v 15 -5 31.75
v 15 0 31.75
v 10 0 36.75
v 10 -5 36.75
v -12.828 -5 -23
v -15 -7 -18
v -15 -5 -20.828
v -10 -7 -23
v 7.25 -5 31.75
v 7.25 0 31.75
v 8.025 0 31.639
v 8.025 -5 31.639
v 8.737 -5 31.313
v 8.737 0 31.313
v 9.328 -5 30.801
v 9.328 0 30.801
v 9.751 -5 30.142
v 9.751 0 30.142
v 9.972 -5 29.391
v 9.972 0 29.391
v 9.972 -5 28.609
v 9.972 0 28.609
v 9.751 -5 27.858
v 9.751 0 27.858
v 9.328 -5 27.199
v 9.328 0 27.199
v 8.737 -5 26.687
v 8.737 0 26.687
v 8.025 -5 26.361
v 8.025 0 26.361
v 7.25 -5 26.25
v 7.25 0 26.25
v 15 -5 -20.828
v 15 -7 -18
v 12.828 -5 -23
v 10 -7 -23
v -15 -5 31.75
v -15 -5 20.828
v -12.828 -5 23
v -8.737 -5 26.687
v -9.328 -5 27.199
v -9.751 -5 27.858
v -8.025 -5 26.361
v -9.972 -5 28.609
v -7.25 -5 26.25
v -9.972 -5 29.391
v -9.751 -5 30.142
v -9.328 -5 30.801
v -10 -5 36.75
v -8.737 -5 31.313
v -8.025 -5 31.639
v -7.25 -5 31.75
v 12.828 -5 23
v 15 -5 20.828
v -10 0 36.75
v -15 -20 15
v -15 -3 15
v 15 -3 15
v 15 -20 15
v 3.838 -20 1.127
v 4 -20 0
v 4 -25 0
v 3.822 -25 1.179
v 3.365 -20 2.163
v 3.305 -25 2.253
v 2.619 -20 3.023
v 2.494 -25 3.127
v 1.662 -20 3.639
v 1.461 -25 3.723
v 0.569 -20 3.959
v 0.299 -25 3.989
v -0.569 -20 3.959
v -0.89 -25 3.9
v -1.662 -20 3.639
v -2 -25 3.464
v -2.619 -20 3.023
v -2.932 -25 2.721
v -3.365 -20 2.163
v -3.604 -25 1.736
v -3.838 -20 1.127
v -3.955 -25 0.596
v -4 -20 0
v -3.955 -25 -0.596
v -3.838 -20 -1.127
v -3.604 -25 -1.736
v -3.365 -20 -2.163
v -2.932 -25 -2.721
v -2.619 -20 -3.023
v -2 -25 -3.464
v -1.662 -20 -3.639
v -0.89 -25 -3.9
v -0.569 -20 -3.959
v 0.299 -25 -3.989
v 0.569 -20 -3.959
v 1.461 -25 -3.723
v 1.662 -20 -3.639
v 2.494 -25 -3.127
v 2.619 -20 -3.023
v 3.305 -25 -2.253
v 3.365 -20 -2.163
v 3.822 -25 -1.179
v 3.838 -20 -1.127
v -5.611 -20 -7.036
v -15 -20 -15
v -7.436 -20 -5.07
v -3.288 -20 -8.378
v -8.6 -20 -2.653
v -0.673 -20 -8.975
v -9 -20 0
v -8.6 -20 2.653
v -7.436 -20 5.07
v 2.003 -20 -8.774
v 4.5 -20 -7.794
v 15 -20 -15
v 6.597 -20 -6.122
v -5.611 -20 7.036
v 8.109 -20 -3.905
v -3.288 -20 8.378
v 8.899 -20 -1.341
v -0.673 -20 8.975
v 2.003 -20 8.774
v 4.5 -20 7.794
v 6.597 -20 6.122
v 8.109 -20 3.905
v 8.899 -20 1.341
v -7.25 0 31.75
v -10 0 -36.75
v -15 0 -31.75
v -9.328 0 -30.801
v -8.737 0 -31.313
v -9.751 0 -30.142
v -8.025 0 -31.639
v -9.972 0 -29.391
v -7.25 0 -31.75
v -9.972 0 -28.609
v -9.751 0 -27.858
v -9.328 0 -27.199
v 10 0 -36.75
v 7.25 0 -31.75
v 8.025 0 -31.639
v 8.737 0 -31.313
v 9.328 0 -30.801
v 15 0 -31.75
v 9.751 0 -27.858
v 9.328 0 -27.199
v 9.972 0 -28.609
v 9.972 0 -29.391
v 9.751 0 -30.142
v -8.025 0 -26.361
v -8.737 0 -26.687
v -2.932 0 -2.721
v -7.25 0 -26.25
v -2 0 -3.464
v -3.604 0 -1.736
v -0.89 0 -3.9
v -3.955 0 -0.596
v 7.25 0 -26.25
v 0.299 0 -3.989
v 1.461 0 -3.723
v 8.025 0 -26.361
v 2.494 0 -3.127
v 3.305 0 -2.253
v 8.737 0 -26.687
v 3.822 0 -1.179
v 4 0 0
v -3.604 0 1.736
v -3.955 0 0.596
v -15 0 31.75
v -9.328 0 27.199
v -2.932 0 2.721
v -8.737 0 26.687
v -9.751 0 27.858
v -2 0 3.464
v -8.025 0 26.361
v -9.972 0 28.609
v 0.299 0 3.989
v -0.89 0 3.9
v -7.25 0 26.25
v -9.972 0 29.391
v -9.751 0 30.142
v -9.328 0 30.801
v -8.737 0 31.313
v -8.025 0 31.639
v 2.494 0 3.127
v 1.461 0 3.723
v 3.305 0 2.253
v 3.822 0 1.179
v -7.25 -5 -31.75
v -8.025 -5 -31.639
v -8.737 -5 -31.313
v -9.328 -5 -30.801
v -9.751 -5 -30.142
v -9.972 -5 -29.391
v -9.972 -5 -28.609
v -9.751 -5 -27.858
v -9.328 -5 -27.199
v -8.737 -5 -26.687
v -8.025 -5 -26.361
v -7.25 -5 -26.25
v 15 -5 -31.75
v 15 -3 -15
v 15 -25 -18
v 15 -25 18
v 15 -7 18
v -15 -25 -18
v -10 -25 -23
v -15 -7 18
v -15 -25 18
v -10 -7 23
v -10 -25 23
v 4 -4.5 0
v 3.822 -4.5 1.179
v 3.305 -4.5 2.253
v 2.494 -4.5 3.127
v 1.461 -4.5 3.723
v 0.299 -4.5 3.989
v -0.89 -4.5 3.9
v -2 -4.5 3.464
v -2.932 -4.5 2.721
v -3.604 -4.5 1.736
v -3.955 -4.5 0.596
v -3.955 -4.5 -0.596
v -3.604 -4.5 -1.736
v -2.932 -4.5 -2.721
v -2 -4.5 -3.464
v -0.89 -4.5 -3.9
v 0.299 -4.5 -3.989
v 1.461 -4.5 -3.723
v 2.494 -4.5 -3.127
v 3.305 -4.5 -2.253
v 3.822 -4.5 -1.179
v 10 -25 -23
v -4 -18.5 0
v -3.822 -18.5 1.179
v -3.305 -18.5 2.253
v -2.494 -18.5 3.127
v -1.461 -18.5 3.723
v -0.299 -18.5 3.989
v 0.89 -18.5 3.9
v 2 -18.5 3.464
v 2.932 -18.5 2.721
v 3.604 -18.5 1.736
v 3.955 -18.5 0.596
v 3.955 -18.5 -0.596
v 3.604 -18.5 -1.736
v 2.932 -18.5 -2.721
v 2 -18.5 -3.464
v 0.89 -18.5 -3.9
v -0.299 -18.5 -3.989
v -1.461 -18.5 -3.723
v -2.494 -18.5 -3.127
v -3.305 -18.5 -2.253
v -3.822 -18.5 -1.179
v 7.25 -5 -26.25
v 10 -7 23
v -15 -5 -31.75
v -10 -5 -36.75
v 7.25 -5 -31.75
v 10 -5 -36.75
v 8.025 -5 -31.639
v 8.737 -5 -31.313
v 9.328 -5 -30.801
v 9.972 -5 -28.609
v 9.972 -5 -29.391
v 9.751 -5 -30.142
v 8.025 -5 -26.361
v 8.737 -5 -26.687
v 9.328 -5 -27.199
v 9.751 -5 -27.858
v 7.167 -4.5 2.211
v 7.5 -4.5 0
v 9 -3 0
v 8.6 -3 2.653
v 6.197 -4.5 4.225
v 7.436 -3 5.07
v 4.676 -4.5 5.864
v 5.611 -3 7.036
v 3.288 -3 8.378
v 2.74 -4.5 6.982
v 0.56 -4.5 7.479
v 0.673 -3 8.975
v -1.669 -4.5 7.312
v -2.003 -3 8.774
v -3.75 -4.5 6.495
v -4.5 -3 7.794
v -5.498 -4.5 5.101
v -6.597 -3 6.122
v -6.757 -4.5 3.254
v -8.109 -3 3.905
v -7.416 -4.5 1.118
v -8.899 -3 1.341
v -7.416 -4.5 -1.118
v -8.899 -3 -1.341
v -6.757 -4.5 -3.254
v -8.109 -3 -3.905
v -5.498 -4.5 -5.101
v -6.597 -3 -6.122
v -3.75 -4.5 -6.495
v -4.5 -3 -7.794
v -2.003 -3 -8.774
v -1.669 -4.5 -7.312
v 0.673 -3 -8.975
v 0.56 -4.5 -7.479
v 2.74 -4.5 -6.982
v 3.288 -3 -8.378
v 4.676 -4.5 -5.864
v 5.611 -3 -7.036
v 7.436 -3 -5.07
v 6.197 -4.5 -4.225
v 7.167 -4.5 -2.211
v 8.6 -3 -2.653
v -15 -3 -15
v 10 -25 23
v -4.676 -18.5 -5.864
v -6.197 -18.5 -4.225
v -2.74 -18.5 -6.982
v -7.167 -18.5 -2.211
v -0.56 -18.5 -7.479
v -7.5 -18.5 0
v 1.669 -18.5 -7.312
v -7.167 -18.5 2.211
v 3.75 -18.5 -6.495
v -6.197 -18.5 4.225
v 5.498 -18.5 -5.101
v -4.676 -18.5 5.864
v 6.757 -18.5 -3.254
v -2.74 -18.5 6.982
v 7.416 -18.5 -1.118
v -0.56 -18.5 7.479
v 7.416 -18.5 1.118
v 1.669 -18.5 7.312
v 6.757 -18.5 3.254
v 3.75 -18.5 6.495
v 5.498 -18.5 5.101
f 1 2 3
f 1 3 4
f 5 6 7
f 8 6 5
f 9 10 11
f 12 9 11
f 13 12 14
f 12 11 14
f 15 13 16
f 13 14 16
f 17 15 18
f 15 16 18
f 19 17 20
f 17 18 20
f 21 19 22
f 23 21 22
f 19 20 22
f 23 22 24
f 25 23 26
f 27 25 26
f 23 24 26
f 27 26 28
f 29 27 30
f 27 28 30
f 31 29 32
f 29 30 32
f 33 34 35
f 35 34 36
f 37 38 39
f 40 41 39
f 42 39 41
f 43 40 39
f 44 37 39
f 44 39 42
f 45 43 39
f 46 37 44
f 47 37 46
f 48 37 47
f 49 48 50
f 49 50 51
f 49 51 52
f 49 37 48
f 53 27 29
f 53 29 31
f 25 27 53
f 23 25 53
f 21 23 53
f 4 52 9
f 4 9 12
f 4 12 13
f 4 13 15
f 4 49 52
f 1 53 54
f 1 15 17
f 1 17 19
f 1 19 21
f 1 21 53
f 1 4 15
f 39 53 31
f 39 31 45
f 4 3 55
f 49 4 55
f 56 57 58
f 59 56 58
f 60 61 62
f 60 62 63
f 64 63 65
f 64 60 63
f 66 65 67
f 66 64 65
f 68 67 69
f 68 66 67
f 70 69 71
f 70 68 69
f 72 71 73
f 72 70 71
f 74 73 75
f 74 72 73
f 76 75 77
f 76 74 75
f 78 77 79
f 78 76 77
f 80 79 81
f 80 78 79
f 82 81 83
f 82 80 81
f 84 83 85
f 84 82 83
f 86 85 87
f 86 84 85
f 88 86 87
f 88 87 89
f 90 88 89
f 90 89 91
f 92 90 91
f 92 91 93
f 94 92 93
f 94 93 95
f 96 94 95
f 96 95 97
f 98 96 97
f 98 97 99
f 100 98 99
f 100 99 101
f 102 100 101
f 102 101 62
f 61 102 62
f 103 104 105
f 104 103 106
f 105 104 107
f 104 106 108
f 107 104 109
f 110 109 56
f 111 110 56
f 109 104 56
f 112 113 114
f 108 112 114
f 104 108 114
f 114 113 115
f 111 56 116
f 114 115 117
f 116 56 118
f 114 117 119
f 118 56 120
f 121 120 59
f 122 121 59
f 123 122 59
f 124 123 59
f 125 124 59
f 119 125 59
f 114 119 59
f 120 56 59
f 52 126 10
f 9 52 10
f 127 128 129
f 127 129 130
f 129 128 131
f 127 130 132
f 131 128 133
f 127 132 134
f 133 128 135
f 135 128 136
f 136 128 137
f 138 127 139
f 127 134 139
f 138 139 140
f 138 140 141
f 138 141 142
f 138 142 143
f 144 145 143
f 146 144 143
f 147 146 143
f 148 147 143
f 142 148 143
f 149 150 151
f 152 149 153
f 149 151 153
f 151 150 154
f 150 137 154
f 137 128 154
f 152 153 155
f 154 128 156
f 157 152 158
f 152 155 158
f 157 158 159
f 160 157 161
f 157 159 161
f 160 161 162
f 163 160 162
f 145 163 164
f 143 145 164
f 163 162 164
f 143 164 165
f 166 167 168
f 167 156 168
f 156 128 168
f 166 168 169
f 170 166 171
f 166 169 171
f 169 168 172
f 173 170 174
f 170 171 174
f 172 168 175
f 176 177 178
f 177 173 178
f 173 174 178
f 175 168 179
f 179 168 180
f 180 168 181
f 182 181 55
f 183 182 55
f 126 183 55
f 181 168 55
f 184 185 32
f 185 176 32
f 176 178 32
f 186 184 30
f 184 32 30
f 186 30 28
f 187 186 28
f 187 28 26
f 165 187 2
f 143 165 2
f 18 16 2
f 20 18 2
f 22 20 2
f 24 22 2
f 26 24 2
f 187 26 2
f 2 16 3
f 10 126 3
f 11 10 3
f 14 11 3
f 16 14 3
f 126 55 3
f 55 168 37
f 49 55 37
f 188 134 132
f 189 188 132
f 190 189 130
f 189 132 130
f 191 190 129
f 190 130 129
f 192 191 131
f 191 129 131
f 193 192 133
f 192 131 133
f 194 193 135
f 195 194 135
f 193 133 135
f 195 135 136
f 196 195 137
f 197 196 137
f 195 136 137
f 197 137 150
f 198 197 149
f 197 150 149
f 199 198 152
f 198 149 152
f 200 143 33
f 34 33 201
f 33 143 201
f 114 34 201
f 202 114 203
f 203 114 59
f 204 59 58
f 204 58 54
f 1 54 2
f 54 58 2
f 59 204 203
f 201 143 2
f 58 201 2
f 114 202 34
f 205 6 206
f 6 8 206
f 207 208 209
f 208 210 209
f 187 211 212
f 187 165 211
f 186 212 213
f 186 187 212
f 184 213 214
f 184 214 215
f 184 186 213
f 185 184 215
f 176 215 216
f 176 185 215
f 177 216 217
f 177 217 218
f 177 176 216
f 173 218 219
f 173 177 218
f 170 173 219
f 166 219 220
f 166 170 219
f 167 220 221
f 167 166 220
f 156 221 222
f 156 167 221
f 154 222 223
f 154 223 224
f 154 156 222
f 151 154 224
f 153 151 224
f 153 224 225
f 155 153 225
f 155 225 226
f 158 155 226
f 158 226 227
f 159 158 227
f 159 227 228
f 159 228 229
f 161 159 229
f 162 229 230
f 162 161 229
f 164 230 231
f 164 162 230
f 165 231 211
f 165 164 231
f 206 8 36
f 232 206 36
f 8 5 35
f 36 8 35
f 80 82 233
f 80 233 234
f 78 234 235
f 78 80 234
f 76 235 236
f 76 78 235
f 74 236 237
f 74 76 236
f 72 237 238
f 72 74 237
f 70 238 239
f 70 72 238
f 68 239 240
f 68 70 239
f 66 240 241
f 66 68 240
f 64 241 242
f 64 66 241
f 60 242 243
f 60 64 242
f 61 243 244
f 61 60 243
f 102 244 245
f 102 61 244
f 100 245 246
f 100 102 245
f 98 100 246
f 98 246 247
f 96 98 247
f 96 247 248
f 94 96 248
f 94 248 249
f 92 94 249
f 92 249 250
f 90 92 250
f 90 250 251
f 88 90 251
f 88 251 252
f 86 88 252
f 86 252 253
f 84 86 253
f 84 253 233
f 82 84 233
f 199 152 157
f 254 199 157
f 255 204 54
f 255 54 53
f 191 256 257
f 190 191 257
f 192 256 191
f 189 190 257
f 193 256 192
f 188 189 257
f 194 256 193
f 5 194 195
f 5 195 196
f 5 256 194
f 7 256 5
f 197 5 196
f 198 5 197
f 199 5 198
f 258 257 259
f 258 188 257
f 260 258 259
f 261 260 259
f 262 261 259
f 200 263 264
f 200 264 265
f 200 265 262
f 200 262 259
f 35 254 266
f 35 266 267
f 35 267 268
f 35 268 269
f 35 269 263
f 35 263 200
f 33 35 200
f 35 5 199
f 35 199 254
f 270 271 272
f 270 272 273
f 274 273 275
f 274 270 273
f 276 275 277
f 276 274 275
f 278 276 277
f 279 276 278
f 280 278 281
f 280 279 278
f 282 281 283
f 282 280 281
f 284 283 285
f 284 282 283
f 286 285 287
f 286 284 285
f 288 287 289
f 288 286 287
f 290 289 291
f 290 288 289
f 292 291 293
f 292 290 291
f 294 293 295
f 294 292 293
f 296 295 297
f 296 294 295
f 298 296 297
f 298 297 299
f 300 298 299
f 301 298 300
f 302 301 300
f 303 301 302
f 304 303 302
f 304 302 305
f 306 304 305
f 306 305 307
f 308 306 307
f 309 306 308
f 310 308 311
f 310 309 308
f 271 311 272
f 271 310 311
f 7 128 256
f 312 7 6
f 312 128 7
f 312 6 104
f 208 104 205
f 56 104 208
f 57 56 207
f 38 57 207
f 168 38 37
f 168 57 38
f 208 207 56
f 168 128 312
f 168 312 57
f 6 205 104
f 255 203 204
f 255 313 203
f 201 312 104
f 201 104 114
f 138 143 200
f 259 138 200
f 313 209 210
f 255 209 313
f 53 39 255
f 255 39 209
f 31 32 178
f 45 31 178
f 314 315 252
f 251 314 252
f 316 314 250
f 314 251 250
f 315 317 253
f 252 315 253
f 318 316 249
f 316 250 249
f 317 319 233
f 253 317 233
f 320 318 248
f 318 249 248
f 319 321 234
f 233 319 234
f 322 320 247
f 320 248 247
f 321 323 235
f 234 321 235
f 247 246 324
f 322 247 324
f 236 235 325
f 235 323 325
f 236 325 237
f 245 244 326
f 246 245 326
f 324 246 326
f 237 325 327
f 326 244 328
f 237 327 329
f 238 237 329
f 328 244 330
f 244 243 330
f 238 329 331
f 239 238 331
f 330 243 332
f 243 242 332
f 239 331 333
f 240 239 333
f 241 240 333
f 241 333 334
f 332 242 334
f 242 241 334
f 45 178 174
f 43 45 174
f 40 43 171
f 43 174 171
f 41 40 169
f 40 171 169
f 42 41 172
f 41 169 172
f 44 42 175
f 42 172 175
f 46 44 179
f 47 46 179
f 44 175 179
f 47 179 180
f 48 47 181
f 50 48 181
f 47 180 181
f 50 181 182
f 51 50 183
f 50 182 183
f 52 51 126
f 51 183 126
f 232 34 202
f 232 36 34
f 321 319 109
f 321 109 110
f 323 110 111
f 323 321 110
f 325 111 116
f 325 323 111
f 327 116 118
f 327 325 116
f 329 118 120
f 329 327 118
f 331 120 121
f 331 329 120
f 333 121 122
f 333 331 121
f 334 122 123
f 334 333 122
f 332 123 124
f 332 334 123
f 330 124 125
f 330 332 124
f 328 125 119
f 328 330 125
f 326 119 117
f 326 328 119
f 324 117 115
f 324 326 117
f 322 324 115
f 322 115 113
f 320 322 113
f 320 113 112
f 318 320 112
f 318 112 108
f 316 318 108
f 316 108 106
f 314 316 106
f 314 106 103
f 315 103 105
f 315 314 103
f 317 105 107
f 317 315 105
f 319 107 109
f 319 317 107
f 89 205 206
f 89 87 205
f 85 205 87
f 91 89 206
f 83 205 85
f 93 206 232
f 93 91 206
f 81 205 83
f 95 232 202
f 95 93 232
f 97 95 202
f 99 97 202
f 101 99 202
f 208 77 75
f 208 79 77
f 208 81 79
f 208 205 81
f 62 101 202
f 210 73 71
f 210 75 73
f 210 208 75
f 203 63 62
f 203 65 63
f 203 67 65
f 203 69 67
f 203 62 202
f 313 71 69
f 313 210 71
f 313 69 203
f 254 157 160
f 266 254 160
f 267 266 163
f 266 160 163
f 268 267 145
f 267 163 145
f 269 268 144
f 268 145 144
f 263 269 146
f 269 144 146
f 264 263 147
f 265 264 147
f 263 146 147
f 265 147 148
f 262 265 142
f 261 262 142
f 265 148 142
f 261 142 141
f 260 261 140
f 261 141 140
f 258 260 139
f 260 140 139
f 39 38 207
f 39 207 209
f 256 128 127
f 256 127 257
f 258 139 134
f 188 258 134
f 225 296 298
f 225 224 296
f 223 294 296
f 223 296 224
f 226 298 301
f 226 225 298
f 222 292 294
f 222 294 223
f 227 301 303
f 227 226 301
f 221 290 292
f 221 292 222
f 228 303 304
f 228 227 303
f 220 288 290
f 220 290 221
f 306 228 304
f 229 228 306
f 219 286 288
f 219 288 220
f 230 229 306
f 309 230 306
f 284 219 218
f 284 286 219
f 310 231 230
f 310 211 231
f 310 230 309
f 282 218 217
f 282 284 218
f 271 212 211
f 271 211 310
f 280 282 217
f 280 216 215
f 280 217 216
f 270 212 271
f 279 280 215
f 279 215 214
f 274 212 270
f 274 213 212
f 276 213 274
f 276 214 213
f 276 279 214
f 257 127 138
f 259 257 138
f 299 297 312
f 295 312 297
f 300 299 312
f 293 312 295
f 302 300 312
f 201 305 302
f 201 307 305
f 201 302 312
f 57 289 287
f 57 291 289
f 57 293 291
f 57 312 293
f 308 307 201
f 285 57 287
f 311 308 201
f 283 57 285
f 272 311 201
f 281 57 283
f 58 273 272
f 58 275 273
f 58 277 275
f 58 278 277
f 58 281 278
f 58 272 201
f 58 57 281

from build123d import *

# Parameters (mm, degrees)
F0_R     = 11
F0_R_2   = 4
F1_DEPTH = 3
F0_W     = 30
F0_H     = 8
F2_DEPTH = 20
F3_DEPTH = 5
F4_W     = 30
F4_H     = 46
F4_R     = 4
F5_DEPTH = 5
F6_R     = 7
F6_R_2   = 4
F7_DEPTH = 1.5
F8_R     = 7
F8_R_2   = 4
F9_DEPTH = 1.5
F10_SIZE = 5
F12_SIZE = 2


# Not quite as in the source:
# - a fillet or chamfer that OpenCascade refuses, or shapes differently, is made with other operations: its cross-section is extruded or revolved along the edge and cut away or added


with BuildPart() as f1:
    # F0 (on Front) → F1 (new body)
    with BuildSketch(Plane.XZ):
        Polygon((15, 15), (-15, 15), (-15, 0), (-15, -15), (15, -15), (15, 0), align=None)
        Circle(F0_R, mode=Mode.SUBTRACT)
        Circle(F0_R)
        Circle(F0_R_2, mode=Mode.SUBTRACT)
    extrude(amount=F1_DEPTH)

    # F0 (on Front) → F2 (join)
    with BuildSketch(Plane.XZ):
        with Locations((0, 19)):
            Rectangle(F0_W, F0_H)
        with Locations((0, -19)):
            Rectangle(F0_W, F0_H)
    extrude(amount=F2_DEPTH)

    # F0 (on Front) → F3 (join)
    with BuildSketch(Plane.XZ):
        Polygon((15, -23), (-15, -23), (-15, -36.75), (0, -36.75), (15, -36.75), align=None)
        with BuildLine():
            ThreePointArc((-7.25, -31.75), (-10, -29), (-7.25, -26.25))
            Line((-7.25, -26.25), (7.25, -26.25))
            ThreePointArc((7.25, -26.25), (10, -29), (7.25, -31.75))
            Line((7.25, -31.75), (-7.25, -31.75))
        make_face(mode=Mode.SUBTRACT)
        Polygon((-15, 36.75), (-15, 23), (15, 23), (15, 36.75), (0, 36.75), align=None)
        with BuildLine():
            ThreePointArc((-7.25, 26.25), (-10, 29), (-7.25, 31.75))
            Line((-7.25, 31.75), (7.25, 31.75))
            ThreePointArc((7.25, 31.75), (10, 29), (7.25, 26.25))
            Line((7.25, 26.25), (-7.25, 26.25))
        make_face(mode=Mode.SUBTRACT)
    extrude(amount=F3_DEPTH)

    # F4 (on face) → F5 (join)
    with BuildSketch(Plane.XZ.offset(20)):
        Rectangle(F4_W, F4_H)
        Circle(F4_R, mode=Mode.SUBTRACT)
    extrude(amount=F5_DEPTH)

    # F6 (on face) → F7 (join)
    with BuildSketch(Plane.XZ.offset(3)):
        Circle(F6_R)
        Circle(F6_R_2, mode=Mode.SUBTRACT)
    extrude(amount=F7_DEPTH)

    # F8 (on face) → F9 (join)
    with BuildSketch(Plane(origin=(0, -20, 0), x_dir=(-1, 0, 0), z_dir=(0, 1, 0))):
        Circle(F8_R)
        Circle(F8_R_2, mode=Mode.SUBTRACT)
    extrude(amount=F9_DEPTH)

    # F10
    f10_edges = [f1.edges().sort_by_distance(p)[0] for p in [
        (15, -2.5, 36.75),
        (-15, -2.5, 36.75),
        (15, -2.5, -36.75),
        (-15, -2.5, -36.75),
        (-15, -15, 23),
        (15, -15, 23),
        (15, -15, -23),
        (-15, -15, -23),
    ]]
    chamfer(f10_edges, length=F10_SIZE)

    # F11: chamfer of 2 on 2 edges, made by hand


with BuildPart() as f11_tool2:
    # F11_s3 → F11_t4 (revolve)
    with BuildSketch(Plane.XY):
        Polygon((9, -3), (7, -5), (7, -3), align=None)
    revolve(axis=Axis((0, -3, 0), (0, -1, 0)))

    split(bisect_by=Plane.XZ.offset(4.5), keep=Keep.BOTTOM)


with BuildPart() as f1_1:
    add(f1.part)

    # F11_t1: union F11_tool2
    add(f11_tool2.part)


with BuildPart() as f11_tool7:
    # F11_s8 → F11_t9 (revolve)
    with BuildSketch(Plane.XY):
        Polygon((-9, -20), (-7, -18), (-7, -20), align=None)
    revolve(axis=Axis((0, -20, 0), (0, 1, 0)))

    split(bisect_by=Plane.XZ.offset(18.5), keep=Keep.TOP)


with BuildPart() as f1_2:
    add(f1_1.part)

    # F11_t6: union F11_tool7
    add(f11_tool7.part)

    # F12
    f12_edges = [f1_2.edges().sort_by_distance(p)[0] for p in [
        (12.5, -5, 20.5),
        (-12.5, -5, 20.5),
        (-12.5, -5, -20.5),
        (12.5, -5, -20.5),
    ]]
    chamfer(f12_edges, length=F12_SIZE)


solid = f1_2.part
